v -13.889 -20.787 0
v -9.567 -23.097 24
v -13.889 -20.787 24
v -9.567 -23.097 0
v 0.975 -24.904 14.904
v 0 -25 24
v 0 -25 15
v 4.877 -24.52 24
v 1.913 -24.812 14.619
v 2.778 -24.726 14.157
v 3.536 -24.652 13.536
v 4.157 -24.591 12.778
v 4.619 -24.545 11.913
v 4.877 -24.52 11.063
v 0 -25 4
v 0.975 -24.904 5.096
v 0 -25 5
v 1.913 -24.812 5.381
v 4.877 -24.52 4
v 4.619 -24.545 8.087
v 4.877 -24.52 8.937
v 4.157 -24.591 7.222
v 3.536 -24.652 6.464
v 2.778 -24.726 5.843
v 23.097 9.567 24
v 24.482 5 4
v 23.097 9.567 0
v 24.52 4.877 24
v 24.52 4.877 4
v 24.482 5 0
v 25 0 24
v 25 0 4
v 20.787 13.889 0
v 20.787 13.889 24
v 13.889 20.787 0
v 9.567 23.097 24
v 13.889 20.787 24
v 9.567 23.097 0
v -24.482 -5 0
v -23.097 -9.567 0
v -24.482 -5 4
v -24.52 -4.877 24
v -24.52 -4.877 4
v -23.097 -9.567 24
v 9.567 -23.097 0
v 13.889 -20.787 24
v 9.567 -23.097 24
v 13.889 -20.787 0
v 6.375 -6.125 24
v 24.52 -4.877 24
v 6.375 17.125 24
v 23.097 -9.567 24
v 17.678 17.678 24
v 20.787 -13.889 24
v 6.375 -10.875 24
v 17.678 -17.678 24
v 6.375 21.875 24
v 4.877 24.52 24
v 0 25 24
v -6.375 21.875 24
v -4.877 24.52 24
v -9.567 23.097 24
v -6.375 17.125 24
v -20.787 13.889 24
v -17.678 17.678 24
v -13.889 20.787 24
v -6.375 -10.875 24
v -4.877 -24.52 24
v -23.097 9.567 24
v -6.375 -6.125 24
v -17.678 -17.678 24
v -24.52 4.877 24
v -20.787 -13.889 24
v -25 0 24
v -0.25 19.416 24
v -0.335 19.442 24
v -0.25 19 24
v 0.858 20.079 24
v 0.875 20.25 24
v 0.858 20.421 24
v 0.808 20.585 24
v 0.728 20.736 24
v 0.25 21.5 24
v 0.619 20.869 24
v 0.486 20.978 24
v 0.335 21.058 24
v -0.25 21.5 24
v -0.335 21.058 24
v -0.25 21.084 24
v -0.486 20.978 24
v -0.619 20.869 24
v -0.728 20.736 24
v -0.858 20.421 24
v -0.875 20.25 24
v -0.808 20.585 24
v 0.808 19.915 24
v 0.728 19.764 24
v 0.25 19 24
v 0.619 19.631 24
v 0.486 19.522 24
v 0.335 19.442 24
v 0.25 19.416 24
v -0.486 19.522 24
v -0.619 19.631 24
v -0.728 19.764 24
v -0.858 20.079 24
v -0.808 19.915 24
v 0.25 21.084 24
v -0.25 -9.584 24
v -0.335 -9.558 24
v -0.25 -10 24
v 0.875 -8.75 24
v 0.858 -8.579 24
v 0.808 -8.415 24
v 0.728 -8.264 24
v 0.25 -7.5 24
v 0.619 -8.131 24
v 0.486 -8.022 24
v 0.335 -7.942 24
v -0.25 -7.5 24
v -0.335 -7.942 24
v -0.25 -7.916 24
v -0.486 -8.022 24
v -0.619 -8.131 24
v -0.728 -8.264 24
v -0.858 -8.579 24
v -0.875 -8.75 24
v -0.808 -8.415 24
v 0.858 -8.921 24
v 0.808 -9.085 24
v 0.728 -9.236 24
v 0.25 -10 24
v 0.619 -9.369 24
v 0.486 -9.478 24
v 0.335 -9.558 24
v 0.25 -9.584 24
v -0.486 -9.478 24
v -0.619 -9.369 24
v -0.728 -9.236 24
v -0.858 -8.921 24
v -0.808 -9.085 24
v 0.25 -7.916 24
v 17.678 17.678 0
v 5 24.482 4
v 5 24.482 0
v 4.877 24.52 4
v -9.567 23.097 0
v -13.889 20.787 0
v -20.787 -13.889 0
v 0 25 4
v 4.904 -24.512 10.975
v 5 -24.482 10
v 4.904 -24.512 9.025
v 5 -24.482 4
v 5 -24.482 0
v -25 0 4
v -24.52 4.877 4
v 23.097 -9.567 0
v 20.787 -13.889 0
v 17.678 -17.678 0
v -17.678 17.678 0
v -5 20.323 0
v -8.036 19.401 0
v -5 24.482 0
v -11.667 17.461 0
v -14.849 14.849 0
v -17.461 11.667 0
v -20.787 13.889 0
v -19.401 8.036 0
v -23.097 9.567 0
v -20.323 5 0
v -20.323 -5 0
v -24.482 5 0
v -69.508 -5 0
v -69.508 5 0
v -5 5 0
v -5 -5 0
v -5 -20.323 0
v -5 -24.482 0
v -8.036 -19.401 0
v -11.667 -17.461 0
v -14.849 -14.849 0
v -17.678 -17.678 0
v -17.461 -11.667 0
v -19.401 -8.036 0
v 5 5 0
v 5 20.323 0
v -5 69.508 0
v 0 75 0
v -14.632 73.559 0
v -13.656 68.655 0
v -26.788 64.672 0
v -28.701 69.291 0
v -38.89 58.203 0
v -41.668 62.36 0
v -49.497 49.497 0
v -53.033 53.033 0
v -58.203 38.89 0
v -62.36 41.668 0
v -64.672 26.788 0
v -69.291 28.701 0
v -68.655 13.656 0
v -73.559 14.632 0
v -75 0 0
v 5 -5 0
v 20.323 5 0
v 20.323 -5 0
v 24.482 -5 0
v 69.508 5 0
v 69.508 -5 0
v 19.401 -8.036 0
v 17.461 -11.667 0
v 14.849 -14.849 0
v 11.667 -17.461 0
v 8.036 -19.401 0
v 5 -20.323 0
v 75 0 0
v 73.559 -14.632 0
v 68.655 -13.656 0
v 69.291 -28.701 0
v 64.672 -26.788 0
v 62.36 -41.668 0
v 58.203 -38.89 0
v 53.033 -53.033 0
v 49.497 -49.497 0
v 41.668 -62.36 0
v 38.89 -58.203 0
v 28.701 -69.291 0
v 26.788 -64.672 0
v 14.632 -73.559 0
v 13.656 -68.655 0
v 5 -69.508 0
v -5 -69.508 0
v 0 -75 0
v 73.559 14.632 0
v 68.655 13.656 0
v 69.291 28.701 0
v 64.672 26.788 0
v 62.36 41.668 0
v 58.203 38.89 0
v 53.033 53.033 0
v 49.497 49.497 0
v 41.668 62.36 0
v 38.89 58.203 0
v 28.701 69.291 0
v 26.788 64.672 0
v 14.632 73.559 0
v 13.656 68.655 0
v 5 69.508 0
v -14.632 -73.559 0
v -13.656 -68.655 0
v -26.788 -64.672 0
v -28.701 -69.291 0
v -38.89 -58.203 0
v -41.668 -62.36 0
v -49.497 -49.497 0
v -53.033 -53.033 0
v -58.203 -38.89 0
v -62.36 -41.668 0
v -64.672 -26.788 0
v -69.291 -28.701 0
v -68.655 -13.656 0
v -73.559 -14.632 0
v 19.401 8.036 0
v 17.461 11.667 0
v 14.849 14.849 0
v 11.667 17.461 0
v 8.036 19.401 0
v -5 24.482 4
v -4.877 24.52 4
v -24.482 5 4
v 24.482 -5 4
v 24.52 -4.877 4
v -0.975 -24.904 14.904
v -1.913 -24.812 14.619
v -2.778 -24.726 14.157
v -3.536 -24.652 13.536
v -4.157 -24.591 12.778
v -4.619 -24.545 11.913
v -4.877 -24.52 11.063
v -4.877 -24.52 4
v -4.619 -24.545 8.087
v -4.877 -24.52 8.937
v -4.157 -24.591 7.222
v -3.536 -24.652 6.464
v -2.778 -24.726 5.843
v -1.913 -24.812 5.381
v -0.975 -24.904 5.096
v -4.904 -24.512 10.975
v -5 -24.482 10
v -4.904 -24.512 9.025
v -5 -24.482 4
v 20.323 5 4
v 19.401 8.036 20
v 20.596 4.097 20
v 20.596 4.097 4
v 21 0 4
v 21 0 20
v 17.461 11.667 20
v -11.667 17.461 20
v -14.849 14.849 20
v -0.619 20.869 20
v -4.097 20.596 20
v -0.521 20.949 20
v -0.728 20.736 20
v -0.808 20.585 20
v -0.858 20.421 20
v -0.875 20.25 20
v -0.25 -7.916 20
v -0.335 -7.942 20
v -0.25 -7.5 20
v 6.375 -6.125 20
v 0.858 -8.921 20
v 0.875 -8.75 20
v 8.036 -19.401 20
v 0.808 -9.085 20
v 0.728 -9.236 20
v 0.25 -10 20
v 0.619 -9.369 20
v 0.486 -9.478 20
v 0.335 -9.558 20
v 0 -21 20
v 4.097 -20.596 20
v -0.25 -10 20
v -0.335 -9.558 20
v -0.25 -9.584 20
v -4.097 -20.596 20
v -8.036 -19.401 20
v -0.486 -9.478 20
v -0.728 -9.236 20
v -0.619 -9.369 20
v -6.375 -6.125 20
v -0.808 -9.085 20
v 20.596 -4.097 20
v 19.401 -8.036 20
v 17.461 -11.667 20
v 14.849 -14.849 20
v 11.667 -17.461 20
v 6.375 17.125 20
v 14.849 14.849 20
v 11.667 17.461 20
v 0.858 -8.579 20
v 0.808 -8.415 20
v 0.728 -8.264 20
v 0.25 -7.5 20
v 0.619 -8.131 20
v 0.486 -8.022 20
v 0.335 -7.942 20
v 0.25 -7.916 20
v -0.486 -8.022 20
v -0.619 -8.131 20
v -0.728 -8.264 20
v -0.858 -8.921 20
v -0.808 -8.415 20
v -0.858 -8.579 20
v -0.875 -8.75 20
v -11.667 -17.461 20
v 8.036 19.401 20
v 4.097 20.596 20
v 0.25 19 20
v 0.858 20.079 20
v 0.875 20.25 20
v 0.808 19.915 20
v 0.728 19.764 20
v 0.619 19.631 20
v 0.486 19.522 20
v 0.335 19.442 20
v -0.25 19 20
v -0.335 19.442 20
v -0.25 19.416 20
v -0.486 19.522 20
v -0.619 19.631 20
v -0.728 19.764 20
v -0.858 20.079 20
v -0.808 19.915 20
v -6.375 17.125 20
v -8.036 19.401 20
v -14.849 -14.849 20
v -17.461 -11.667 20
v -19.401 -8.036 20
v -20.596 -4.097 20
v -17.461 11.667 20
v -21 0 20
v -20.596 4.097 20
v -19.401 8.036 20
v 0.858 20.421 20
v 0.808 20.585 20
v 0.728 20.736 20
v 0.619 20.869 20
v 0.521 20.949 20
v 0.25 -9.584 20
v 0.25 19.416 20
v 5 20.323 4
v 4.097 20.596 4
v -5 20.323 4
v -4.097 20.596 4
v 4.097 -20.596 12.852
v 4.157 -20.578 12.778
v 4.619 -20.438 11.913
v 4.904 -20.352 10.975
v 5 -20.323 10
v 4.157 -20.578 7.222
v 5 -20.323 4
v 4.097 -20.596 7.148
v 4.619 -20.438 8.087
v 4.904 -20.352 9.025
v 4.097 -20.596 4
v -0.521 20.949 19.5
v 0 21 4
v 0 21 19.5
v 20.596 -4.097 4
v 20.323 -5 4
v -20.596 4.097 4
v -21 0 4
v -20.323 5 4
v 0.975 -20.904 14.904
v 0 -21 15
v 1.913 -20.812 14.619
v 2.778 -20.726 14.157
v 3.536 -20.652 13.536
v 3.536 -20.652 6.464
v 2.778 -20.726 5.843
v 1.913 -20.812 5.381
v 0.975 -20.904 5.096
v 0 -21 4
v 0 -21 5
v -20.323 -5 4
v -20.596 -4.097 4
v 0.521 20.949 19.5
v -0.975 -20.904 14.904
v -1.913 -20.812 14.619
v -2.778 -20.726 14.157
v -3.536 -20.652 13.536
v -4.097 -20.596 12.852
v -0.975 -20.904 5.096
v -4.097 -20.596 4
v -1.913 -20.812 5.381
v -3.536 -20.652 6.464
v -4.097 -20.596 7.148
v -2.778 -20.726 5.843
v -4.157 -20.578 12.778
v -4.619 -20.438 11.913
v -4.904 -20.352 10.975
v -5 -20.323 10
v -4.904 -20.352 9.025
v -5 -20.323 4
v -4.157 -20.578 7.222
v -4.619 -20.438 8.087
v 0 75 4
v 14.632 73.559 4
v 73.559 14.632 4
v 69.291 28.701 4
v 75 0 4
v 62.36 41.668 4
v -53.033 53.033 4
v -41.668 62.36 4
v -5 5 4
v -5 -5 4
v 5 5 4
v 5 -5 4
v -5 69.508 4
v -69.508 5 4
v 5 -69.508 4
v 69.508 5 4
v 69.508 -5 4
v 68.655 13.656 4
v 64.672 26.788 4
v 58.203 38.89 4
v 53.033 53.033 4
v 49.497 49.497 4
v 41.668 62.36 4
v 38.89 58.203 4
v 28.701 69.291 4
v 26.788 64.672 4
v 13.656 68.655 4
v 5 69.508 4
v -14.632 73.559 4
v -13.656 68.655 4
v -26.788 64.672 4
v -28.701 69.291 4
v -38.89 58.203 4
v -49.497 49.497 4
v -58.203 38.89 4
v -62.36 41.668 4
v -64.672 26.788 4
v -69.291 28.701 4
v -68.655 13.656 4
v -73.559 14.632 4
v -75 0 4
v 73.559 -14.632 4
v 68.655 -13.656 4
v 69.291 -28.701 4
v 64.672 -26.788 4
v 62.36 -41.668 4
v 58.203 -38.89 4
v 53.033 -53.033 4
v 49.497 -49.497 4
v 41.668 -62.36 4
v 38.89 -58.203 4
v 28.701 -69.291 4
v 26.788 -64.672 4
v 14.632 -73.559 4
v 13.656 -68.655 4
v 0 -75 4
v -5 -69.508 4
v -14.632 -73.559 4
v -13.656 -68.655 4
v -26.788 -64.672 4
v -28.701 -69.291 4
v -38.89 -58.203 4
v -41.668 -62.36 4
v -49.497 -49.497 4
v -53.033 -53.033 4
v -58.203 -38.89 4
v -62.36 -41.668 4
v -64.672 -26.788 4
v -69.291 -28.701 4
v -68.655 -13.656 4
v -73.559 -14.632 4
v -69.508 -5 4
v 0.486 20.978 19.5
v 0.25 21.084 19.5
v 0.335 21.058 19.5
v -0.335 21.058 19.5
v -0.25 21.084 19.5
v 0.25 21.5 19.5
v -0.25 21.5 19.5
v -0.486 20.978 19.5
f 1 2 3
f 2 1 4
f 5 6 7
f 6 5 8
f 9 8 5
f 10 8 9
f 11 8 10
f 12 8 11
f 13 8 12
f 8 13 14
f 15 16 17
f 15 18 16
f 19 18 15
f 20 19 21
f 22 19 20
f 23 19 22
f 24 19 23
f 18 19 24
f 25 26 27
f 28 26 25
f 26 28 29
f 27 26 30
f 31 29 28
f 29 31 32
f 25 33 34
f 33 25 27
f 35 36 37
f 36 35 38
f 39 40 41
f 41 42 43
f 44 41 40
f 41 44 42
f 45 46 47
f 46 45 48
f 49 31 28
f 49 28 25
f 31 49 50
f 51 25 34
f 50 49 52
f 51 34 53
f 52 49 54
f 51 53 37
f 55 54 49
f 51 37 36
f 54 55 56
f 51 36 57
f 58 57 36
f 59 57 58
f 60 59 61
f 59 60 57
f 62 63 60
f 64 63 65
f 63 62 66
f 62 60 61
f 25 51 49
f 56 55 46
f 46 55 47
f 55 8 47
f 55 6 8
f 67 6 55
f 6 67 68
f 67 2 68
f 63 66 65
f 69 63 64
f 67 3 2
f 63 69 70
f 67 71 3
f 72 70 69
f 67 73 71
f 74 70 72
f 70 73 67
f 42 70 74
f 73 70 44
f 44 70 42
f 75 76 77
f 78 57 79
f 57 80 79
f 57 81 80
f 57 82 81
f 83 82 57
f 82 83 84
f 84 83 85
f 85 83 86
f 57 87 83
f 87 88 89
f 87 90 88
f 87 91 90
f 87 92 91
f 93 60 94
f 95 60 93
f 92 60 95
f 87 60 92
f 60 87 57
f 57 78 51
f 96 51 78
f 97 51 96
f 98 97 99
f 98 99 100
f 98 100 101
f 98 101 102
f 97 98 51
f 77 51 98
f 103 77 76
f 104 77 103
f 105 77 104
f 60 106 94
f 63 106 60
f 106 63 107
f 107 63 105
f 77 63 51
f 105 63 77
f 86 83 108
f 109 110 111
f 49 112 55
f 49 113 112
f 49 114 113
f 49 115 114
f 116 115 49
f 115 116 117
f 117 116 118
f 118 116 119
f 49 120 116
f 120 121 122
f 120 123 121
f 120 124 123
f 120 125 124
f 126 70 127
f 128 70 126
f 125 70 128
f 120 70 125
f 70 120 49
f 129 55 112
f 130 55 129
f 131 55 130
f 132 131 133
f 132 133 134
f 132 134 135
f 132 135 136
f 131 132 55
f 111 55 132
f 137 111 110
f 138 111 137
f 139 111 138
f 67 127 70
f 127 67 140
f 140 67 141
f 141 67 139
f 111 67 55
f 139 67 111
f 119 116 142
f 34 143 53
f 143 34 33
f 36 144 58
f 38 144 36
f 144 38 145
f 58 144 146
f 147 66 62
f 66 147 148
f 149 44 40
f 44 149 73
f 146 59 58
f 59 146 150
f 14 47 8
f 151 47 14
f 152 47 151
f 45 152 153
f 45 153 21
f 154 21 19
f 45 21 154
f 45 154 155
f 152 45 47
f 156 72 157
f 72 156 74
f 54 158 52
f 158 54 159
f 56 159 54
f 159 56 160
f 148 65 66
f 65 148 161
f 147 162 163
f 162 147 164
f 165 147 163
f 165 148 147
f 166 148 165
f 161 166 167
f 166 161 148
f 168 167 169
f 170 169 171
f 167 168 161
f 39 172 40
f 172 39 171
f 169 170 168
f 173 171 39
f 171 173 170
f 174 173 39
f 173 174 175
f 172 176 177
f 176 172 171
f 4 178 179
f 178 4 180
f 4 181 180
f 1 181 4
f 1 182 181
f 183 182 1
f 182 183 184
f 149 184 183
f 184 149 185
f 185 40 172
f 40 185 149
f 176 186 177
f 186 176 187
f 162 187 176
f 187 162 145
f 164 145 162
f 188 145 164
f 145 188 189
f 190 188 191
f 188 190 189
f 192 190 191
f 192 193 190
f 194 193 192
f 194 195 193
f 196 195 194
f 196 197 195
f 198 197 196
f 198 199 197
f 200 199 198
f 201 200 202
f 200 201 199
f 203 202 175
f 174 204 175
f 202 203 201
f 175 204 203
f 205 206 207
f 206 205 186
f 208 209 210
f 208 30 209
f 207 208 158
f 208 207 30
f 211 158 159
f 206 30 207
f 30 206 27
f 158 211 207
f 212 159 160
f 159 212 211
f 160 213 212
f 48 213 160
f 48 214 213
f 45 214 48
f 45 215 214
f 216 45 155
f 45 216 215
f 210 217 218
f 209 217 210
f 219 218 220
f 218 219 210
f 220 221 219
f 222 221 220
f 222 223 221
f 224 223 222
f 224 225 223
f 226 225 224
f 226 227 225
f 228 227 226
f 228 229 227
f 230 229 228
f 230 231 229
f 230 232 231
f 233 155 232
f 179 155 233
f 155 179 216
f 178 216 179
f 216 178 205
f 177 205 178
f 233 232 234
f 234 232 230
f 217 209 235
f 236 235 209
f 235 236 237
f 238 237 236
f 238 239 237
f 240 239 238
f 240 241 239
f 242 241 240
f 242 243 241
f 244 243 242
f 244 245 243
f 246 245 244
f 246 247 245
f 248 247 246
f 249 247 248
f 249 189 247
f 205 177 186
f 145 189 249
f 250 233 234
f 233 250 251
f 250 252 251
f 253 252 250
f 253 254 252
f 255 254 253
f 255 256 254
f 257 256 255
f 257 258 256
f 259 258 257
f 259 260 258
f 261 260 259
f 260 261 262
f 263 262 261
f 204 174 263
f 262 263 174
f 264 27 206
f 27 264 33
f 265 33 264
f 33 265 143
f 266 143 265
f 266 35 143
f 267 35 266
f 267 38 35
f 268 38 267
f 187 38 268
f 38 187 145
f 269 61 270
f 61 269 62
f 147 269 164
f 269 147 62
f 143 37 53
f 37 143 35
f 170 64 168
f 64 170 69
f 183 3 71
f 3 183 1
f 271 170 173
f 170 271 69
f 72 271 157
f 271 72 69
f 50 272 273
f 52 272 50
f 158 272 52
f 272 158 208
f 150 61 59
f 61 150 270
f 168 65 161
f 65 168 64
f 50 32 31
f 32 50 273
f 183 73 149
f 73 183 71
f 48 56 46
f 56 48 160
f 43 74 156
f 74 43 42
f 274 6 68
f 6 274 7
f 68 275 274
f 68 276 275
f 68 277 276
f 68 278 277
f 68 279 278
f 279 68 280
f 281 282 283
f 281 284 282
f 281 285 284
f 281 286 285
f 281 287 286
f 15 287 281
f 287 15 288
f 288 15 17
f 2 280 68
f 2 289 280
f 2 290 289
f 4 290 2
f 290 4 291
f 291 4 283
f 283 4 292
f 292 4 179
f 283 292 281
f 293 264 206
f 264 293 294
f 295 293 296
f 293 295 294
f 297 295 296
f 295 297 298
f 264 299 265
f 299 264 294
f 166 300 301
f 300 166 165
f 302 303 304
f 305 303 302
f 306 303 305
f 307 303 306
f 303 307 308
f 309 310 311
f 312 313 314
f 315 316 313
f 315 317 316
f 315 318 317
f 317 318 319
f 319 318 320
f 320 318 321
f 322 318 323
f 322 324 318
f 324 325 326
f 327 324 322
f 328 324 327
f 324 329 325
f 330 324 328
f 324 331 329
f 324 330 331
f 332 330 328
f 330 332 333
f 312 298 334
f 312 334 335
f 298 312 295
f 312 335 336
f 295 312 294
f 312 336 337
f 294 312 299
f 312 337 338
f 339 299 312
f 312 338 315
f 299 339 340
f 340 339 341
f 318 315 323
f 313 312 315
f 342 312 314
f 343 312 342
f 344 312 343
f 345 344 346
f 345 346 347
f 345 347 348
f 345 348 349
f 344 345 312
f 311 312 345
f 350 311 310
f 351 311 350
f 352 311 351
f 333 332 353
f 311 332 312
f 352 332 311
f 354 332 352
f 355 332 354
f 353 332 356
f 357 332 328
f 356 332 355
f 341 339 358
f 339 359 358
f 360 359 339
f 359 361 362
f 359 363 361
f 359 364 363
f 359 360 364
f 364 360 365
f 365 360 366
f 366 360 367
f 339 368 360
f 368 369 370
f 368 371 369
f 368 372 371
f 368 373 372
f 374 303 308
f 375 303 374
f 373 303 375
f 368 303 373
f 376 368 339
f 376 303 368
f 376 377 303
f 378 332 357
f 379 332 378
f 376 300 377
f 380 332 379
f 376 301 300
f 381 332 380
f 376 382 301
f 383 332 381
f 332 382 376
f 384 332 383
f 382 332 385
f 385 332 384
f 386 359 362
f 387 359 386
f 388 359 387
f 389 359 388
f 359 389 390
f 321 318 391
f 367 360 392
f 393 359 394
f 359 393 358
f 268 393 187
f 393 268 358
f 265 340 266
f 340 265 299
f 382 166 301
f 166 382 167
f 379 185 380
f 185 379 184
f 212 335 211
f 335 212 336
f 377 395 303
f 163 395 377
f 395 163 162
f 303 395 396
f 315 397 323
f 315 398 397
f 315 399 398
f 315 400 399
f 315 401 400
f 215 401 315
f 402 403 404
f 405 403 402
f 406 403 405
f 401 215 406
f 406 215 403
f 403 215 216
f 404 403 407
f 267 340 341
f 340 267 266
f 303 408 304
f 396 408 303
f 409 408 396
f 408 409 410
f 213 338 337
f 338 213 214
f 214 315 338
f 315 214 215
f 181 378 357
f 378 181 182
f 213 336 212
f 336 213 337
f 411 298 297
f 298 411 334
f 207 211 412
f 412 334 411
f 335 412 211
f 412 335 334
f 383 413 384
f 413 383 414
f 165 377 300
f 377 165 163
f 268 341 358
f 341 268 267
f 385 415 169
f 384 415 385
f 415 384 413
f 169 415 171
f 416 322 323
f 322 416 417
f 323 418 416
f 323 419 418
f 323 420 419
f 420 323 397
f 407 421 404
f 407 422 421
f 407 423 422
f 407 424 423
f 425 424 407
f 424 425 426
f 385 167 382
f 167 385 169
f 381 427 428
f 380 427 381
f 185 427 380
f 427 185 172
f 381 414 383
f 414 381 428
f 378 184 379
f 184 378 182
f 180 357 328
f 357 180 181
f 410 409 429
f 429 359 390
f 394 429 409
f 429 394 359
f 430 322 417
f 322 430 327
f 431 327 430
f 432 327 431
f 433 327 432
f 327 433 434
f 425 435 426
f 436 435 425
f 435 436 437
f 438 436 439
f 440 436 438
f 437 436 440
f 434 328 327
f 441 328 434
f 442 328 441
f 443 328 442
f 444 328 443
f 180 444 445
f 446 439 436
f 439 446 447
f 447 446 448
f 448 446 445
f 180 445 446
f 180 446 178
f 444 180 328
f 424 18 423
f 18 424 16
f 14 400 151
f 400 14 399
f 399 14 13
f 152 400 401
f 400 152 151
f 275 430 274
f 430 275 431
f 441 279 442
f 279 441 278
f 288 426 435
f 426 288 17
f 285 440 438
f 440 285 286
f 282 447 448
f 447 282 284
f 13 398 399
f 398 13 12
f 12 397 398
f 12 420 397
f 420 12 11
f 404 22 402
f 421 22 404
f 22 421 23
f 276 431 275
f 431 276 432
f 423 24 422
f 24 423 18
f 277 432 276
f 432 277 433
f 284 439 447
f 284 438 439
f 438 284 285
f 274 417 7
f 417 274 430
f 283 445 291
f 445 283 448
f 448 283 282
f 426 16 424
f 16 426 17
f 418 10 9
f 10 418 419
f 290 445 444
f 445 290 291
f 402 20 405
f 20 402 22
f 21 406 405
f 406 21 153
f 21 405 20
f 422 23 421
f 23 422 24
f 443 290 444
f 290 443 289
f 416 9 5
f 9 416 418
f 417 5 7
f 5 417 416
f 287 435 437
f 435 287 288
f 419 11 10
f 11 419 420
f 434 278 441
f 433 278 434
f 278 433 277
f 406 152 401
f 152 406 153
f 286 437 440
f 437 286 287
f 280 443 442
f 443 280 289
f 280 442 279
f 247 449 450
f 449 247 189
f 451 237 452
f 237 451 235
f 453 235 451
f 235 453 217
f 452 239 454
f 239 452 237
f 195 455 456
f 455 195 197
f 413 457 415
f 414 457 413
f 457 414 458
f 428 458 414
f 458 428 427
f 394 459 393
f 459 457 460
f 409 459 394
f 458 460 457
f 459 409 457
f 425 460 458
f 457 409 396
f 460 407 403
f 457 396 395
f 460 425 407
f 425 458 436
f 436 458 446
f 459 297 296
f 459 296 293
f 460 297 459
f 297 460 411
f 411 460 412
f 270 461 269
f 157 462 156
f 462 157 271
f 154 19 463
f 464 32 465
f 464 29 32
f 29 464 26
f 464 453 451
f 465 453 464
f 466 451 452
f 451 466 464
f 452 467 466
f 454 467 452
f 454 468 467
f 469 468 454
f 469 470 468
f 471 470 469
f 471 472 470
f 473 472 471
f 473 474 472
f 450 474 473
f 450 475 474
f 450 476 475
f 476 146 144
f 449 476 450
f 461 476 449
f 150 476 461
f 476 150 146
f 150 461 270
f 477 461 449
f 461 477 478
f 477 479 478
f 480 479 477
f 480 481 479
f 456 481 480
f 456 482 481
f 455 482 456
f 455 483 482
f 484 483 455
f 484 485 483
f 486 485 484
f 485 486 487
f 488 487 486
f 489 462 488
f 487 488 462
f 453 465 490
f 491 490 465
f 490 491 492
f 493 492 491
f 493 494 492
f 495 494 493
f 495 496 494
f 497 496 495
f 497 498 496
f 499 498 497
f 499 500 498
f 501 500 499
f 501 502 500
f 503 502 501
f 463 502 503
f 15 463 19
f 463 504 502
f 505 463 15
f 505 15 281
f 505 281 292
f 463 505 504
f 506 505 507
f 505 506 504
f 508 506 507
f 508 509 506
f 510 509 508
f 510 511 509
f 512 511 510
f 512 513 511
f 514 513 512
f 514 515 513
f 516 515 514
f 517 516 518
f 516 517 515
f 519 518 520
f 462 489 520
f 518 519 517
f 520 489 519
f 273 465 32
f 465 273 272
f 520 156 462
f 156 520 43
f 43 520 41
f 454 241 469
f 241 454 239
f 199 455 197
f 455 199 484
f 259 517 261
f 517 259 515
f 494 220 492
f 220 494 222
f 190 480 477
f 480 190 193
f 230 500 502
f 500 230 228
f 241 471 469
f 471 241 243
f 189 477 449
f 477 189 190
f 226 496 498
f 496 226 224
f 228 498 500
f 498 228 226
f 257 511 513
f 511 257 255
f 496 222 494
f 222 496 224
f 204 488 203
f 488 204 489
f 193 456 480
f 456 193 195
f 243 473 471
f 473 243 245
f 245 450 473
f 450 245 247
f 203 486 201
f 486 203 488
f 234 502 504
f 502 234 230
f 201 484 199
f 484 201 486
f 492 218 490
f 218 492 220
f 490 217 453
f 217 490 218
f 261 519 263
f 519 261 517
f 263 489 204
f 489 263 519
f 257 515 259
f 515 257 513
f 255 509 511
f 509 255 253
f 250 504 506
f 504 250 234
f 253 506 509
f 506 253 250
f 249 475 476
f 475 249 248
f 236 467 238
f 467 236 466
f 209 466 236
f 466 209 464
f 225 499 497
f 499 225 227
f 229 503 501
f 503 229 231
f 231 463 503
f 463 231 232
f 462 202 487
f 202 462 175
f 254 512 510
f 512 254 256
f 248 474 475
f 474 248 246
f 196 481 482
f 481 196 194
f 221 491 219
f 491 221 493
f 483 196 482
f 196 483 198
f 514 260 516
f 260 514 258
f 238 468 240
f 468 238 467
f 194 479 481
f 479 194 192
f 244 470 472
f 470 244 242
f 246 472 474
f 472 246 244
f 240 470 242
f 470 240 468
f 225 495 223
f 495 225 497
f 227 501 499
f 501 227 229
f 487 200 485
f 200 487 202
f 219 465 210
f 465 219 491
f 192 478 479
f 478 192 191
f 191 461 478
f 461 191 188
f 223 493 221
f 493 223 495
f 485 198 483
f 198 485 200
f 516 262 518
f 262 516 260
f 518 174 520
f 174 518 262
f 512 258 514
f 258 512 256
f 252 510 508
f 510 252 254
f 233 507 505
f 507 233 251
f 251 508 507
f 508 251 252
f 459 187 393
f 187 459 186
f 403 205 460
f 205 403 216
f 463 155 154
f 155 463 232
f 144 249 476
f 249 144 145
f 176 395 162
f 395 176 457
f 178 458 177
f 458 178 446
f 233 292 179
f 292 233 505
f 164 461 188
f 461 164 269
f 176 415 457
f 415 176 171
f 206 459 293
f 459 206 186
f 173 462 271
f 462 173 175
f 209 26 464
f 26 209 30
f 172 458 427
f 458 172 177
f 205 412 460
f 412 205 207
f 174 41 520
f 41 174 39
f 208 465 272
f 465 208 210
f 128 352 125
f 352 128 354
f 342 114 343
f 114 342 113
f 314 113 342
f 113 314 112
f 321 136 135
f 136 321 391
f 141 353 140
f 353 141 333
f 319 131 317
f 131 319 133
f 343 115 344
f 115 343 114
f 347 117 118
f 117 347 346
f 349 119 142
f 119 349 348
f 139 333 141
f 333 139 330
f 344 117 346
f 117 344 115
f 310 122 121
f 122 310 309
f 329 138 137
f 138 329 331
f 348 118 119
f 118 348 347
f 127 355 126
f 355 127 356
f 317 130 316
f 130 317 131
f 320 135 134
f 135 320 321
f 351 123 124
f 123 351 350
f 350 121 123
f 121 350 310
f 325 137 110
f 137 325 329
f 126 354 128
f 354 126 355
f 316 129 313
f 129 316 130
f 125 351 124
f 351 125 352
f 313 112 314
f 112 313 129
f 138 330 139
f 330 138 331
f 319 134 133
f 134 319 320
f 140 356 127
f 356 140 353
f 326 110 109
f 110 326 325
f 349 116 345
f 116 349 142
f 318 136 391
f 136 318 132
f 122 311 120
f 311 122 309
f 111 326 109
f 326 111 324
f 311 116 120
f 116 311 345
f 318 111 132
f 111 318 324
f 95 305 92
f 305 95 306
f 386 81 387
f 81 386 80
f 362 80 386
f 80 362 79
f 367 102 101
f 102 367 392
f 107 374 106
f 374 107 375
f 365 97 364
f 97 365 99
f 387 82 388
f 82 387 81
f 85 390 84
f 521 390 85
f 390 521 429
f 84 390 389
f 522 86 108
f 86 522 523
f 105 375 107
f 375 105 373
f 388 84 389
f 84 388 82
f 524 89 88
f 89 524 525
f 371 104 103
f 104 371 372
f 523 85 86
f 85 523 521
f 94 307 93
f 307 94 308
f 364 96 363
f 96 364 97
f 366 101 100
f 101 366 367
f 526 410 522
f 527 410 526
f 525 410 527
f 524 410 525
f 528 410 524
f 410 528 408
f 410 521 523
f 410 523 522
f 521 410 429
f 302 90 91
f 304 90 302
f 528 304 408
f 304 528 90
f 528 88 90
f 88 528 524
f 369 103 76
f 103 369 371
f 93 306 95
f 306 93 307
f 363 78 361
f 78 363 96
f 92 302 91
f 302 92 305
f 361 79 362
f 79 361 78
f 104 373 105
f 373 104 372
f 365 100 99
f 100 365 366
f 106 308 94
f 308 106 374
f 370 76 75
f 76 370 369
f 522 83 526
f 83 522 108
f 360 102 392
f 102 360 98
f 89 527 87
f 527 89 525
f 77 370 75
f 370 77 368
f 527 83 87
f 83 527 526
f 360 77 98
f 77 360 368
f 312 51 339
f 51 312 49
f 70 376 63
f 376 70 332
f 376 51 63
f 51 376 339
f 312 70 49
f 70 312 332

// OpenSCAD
// file: SG-90.scad
$fn = 32;

// the motor will be this much wider horizontally, so that holes made by difference with it will have tolerance.
// this will also be added to the radius of the horns circles.
toleranceGap = 0.25; 

module sg90()
{
    union()
    {
         // Body
        translate([0, 5.5, -6.5])
        cube([12.5 + toleranceGap, 23 + toleranceGap, 24], true);
        // Collar
        translate([0, 5.5, 2.5/2])
        cube([12.5 + toleranceGap, 32.5 + toleranceGap, 2.5], true);
        // Raise
        translate([0, 0, 24-18.5])
        cylinder(h=4.5, d=11.5);
        
        // Screw holes

        translate([0, -11.5/2-3, -4.5])
        union()
        {
            cylinder(h=4.5, d=1.75);
            translate([0, 0, 2.25])
            cube([0.5, 2.5, 4.5], true);
        }
        translate([0, -11.5/2+26, -4.5])
        union()
        {
            cylinder(h=4.5, d=1.75);
            translate([0, 0, 2.25])
            cube([0.5, 2.5, 4.5], true);
        }
    }
}

module horn()
{
    // Bottom part
    translate([0, 0, -2.5])
    cylinder(h=4, d=7+toleranceGap);
    // Horn part
    hull()
    {
        translate([0, 14, 0])
        cylinder(h=1.5, d=4+toleranceGap);
        cylinder(h=1.5, d=5.5+toleranceGap);
    }
}

difference()
{
    cube([15, 65, 4]);
    translate([15/2, 15, 4])
    #sg90();
    translate([15/2, 45, 2.5])
    #horn();
}
// main file
use <SG-90.scad>
$fn = 32;


module cutOuts()
{
    union()
    {
        translate([0, 0, 24])
        sg90();
    }
}

difference()
{
    union()
    {
        //center
        difference()
        {
            cylinder(h=24, d=50);
            cylinder(h=20, d=42);
            translate([0, 0, 10])
            rotate([90, 0, 0])
            #cylinder(h=50, d=10);
        }
        //cross
        translate([-5, -70, 0])
        cube([10, 140, 4]);
        translate([-70, -5, 0])
        cube([140, 10, 4]);
        //outer ring
        difference()
        {
            cylinder(h=4, d=150);
            cylinder(h=4, d=140);
        }
    }
    cutOuts();
}
